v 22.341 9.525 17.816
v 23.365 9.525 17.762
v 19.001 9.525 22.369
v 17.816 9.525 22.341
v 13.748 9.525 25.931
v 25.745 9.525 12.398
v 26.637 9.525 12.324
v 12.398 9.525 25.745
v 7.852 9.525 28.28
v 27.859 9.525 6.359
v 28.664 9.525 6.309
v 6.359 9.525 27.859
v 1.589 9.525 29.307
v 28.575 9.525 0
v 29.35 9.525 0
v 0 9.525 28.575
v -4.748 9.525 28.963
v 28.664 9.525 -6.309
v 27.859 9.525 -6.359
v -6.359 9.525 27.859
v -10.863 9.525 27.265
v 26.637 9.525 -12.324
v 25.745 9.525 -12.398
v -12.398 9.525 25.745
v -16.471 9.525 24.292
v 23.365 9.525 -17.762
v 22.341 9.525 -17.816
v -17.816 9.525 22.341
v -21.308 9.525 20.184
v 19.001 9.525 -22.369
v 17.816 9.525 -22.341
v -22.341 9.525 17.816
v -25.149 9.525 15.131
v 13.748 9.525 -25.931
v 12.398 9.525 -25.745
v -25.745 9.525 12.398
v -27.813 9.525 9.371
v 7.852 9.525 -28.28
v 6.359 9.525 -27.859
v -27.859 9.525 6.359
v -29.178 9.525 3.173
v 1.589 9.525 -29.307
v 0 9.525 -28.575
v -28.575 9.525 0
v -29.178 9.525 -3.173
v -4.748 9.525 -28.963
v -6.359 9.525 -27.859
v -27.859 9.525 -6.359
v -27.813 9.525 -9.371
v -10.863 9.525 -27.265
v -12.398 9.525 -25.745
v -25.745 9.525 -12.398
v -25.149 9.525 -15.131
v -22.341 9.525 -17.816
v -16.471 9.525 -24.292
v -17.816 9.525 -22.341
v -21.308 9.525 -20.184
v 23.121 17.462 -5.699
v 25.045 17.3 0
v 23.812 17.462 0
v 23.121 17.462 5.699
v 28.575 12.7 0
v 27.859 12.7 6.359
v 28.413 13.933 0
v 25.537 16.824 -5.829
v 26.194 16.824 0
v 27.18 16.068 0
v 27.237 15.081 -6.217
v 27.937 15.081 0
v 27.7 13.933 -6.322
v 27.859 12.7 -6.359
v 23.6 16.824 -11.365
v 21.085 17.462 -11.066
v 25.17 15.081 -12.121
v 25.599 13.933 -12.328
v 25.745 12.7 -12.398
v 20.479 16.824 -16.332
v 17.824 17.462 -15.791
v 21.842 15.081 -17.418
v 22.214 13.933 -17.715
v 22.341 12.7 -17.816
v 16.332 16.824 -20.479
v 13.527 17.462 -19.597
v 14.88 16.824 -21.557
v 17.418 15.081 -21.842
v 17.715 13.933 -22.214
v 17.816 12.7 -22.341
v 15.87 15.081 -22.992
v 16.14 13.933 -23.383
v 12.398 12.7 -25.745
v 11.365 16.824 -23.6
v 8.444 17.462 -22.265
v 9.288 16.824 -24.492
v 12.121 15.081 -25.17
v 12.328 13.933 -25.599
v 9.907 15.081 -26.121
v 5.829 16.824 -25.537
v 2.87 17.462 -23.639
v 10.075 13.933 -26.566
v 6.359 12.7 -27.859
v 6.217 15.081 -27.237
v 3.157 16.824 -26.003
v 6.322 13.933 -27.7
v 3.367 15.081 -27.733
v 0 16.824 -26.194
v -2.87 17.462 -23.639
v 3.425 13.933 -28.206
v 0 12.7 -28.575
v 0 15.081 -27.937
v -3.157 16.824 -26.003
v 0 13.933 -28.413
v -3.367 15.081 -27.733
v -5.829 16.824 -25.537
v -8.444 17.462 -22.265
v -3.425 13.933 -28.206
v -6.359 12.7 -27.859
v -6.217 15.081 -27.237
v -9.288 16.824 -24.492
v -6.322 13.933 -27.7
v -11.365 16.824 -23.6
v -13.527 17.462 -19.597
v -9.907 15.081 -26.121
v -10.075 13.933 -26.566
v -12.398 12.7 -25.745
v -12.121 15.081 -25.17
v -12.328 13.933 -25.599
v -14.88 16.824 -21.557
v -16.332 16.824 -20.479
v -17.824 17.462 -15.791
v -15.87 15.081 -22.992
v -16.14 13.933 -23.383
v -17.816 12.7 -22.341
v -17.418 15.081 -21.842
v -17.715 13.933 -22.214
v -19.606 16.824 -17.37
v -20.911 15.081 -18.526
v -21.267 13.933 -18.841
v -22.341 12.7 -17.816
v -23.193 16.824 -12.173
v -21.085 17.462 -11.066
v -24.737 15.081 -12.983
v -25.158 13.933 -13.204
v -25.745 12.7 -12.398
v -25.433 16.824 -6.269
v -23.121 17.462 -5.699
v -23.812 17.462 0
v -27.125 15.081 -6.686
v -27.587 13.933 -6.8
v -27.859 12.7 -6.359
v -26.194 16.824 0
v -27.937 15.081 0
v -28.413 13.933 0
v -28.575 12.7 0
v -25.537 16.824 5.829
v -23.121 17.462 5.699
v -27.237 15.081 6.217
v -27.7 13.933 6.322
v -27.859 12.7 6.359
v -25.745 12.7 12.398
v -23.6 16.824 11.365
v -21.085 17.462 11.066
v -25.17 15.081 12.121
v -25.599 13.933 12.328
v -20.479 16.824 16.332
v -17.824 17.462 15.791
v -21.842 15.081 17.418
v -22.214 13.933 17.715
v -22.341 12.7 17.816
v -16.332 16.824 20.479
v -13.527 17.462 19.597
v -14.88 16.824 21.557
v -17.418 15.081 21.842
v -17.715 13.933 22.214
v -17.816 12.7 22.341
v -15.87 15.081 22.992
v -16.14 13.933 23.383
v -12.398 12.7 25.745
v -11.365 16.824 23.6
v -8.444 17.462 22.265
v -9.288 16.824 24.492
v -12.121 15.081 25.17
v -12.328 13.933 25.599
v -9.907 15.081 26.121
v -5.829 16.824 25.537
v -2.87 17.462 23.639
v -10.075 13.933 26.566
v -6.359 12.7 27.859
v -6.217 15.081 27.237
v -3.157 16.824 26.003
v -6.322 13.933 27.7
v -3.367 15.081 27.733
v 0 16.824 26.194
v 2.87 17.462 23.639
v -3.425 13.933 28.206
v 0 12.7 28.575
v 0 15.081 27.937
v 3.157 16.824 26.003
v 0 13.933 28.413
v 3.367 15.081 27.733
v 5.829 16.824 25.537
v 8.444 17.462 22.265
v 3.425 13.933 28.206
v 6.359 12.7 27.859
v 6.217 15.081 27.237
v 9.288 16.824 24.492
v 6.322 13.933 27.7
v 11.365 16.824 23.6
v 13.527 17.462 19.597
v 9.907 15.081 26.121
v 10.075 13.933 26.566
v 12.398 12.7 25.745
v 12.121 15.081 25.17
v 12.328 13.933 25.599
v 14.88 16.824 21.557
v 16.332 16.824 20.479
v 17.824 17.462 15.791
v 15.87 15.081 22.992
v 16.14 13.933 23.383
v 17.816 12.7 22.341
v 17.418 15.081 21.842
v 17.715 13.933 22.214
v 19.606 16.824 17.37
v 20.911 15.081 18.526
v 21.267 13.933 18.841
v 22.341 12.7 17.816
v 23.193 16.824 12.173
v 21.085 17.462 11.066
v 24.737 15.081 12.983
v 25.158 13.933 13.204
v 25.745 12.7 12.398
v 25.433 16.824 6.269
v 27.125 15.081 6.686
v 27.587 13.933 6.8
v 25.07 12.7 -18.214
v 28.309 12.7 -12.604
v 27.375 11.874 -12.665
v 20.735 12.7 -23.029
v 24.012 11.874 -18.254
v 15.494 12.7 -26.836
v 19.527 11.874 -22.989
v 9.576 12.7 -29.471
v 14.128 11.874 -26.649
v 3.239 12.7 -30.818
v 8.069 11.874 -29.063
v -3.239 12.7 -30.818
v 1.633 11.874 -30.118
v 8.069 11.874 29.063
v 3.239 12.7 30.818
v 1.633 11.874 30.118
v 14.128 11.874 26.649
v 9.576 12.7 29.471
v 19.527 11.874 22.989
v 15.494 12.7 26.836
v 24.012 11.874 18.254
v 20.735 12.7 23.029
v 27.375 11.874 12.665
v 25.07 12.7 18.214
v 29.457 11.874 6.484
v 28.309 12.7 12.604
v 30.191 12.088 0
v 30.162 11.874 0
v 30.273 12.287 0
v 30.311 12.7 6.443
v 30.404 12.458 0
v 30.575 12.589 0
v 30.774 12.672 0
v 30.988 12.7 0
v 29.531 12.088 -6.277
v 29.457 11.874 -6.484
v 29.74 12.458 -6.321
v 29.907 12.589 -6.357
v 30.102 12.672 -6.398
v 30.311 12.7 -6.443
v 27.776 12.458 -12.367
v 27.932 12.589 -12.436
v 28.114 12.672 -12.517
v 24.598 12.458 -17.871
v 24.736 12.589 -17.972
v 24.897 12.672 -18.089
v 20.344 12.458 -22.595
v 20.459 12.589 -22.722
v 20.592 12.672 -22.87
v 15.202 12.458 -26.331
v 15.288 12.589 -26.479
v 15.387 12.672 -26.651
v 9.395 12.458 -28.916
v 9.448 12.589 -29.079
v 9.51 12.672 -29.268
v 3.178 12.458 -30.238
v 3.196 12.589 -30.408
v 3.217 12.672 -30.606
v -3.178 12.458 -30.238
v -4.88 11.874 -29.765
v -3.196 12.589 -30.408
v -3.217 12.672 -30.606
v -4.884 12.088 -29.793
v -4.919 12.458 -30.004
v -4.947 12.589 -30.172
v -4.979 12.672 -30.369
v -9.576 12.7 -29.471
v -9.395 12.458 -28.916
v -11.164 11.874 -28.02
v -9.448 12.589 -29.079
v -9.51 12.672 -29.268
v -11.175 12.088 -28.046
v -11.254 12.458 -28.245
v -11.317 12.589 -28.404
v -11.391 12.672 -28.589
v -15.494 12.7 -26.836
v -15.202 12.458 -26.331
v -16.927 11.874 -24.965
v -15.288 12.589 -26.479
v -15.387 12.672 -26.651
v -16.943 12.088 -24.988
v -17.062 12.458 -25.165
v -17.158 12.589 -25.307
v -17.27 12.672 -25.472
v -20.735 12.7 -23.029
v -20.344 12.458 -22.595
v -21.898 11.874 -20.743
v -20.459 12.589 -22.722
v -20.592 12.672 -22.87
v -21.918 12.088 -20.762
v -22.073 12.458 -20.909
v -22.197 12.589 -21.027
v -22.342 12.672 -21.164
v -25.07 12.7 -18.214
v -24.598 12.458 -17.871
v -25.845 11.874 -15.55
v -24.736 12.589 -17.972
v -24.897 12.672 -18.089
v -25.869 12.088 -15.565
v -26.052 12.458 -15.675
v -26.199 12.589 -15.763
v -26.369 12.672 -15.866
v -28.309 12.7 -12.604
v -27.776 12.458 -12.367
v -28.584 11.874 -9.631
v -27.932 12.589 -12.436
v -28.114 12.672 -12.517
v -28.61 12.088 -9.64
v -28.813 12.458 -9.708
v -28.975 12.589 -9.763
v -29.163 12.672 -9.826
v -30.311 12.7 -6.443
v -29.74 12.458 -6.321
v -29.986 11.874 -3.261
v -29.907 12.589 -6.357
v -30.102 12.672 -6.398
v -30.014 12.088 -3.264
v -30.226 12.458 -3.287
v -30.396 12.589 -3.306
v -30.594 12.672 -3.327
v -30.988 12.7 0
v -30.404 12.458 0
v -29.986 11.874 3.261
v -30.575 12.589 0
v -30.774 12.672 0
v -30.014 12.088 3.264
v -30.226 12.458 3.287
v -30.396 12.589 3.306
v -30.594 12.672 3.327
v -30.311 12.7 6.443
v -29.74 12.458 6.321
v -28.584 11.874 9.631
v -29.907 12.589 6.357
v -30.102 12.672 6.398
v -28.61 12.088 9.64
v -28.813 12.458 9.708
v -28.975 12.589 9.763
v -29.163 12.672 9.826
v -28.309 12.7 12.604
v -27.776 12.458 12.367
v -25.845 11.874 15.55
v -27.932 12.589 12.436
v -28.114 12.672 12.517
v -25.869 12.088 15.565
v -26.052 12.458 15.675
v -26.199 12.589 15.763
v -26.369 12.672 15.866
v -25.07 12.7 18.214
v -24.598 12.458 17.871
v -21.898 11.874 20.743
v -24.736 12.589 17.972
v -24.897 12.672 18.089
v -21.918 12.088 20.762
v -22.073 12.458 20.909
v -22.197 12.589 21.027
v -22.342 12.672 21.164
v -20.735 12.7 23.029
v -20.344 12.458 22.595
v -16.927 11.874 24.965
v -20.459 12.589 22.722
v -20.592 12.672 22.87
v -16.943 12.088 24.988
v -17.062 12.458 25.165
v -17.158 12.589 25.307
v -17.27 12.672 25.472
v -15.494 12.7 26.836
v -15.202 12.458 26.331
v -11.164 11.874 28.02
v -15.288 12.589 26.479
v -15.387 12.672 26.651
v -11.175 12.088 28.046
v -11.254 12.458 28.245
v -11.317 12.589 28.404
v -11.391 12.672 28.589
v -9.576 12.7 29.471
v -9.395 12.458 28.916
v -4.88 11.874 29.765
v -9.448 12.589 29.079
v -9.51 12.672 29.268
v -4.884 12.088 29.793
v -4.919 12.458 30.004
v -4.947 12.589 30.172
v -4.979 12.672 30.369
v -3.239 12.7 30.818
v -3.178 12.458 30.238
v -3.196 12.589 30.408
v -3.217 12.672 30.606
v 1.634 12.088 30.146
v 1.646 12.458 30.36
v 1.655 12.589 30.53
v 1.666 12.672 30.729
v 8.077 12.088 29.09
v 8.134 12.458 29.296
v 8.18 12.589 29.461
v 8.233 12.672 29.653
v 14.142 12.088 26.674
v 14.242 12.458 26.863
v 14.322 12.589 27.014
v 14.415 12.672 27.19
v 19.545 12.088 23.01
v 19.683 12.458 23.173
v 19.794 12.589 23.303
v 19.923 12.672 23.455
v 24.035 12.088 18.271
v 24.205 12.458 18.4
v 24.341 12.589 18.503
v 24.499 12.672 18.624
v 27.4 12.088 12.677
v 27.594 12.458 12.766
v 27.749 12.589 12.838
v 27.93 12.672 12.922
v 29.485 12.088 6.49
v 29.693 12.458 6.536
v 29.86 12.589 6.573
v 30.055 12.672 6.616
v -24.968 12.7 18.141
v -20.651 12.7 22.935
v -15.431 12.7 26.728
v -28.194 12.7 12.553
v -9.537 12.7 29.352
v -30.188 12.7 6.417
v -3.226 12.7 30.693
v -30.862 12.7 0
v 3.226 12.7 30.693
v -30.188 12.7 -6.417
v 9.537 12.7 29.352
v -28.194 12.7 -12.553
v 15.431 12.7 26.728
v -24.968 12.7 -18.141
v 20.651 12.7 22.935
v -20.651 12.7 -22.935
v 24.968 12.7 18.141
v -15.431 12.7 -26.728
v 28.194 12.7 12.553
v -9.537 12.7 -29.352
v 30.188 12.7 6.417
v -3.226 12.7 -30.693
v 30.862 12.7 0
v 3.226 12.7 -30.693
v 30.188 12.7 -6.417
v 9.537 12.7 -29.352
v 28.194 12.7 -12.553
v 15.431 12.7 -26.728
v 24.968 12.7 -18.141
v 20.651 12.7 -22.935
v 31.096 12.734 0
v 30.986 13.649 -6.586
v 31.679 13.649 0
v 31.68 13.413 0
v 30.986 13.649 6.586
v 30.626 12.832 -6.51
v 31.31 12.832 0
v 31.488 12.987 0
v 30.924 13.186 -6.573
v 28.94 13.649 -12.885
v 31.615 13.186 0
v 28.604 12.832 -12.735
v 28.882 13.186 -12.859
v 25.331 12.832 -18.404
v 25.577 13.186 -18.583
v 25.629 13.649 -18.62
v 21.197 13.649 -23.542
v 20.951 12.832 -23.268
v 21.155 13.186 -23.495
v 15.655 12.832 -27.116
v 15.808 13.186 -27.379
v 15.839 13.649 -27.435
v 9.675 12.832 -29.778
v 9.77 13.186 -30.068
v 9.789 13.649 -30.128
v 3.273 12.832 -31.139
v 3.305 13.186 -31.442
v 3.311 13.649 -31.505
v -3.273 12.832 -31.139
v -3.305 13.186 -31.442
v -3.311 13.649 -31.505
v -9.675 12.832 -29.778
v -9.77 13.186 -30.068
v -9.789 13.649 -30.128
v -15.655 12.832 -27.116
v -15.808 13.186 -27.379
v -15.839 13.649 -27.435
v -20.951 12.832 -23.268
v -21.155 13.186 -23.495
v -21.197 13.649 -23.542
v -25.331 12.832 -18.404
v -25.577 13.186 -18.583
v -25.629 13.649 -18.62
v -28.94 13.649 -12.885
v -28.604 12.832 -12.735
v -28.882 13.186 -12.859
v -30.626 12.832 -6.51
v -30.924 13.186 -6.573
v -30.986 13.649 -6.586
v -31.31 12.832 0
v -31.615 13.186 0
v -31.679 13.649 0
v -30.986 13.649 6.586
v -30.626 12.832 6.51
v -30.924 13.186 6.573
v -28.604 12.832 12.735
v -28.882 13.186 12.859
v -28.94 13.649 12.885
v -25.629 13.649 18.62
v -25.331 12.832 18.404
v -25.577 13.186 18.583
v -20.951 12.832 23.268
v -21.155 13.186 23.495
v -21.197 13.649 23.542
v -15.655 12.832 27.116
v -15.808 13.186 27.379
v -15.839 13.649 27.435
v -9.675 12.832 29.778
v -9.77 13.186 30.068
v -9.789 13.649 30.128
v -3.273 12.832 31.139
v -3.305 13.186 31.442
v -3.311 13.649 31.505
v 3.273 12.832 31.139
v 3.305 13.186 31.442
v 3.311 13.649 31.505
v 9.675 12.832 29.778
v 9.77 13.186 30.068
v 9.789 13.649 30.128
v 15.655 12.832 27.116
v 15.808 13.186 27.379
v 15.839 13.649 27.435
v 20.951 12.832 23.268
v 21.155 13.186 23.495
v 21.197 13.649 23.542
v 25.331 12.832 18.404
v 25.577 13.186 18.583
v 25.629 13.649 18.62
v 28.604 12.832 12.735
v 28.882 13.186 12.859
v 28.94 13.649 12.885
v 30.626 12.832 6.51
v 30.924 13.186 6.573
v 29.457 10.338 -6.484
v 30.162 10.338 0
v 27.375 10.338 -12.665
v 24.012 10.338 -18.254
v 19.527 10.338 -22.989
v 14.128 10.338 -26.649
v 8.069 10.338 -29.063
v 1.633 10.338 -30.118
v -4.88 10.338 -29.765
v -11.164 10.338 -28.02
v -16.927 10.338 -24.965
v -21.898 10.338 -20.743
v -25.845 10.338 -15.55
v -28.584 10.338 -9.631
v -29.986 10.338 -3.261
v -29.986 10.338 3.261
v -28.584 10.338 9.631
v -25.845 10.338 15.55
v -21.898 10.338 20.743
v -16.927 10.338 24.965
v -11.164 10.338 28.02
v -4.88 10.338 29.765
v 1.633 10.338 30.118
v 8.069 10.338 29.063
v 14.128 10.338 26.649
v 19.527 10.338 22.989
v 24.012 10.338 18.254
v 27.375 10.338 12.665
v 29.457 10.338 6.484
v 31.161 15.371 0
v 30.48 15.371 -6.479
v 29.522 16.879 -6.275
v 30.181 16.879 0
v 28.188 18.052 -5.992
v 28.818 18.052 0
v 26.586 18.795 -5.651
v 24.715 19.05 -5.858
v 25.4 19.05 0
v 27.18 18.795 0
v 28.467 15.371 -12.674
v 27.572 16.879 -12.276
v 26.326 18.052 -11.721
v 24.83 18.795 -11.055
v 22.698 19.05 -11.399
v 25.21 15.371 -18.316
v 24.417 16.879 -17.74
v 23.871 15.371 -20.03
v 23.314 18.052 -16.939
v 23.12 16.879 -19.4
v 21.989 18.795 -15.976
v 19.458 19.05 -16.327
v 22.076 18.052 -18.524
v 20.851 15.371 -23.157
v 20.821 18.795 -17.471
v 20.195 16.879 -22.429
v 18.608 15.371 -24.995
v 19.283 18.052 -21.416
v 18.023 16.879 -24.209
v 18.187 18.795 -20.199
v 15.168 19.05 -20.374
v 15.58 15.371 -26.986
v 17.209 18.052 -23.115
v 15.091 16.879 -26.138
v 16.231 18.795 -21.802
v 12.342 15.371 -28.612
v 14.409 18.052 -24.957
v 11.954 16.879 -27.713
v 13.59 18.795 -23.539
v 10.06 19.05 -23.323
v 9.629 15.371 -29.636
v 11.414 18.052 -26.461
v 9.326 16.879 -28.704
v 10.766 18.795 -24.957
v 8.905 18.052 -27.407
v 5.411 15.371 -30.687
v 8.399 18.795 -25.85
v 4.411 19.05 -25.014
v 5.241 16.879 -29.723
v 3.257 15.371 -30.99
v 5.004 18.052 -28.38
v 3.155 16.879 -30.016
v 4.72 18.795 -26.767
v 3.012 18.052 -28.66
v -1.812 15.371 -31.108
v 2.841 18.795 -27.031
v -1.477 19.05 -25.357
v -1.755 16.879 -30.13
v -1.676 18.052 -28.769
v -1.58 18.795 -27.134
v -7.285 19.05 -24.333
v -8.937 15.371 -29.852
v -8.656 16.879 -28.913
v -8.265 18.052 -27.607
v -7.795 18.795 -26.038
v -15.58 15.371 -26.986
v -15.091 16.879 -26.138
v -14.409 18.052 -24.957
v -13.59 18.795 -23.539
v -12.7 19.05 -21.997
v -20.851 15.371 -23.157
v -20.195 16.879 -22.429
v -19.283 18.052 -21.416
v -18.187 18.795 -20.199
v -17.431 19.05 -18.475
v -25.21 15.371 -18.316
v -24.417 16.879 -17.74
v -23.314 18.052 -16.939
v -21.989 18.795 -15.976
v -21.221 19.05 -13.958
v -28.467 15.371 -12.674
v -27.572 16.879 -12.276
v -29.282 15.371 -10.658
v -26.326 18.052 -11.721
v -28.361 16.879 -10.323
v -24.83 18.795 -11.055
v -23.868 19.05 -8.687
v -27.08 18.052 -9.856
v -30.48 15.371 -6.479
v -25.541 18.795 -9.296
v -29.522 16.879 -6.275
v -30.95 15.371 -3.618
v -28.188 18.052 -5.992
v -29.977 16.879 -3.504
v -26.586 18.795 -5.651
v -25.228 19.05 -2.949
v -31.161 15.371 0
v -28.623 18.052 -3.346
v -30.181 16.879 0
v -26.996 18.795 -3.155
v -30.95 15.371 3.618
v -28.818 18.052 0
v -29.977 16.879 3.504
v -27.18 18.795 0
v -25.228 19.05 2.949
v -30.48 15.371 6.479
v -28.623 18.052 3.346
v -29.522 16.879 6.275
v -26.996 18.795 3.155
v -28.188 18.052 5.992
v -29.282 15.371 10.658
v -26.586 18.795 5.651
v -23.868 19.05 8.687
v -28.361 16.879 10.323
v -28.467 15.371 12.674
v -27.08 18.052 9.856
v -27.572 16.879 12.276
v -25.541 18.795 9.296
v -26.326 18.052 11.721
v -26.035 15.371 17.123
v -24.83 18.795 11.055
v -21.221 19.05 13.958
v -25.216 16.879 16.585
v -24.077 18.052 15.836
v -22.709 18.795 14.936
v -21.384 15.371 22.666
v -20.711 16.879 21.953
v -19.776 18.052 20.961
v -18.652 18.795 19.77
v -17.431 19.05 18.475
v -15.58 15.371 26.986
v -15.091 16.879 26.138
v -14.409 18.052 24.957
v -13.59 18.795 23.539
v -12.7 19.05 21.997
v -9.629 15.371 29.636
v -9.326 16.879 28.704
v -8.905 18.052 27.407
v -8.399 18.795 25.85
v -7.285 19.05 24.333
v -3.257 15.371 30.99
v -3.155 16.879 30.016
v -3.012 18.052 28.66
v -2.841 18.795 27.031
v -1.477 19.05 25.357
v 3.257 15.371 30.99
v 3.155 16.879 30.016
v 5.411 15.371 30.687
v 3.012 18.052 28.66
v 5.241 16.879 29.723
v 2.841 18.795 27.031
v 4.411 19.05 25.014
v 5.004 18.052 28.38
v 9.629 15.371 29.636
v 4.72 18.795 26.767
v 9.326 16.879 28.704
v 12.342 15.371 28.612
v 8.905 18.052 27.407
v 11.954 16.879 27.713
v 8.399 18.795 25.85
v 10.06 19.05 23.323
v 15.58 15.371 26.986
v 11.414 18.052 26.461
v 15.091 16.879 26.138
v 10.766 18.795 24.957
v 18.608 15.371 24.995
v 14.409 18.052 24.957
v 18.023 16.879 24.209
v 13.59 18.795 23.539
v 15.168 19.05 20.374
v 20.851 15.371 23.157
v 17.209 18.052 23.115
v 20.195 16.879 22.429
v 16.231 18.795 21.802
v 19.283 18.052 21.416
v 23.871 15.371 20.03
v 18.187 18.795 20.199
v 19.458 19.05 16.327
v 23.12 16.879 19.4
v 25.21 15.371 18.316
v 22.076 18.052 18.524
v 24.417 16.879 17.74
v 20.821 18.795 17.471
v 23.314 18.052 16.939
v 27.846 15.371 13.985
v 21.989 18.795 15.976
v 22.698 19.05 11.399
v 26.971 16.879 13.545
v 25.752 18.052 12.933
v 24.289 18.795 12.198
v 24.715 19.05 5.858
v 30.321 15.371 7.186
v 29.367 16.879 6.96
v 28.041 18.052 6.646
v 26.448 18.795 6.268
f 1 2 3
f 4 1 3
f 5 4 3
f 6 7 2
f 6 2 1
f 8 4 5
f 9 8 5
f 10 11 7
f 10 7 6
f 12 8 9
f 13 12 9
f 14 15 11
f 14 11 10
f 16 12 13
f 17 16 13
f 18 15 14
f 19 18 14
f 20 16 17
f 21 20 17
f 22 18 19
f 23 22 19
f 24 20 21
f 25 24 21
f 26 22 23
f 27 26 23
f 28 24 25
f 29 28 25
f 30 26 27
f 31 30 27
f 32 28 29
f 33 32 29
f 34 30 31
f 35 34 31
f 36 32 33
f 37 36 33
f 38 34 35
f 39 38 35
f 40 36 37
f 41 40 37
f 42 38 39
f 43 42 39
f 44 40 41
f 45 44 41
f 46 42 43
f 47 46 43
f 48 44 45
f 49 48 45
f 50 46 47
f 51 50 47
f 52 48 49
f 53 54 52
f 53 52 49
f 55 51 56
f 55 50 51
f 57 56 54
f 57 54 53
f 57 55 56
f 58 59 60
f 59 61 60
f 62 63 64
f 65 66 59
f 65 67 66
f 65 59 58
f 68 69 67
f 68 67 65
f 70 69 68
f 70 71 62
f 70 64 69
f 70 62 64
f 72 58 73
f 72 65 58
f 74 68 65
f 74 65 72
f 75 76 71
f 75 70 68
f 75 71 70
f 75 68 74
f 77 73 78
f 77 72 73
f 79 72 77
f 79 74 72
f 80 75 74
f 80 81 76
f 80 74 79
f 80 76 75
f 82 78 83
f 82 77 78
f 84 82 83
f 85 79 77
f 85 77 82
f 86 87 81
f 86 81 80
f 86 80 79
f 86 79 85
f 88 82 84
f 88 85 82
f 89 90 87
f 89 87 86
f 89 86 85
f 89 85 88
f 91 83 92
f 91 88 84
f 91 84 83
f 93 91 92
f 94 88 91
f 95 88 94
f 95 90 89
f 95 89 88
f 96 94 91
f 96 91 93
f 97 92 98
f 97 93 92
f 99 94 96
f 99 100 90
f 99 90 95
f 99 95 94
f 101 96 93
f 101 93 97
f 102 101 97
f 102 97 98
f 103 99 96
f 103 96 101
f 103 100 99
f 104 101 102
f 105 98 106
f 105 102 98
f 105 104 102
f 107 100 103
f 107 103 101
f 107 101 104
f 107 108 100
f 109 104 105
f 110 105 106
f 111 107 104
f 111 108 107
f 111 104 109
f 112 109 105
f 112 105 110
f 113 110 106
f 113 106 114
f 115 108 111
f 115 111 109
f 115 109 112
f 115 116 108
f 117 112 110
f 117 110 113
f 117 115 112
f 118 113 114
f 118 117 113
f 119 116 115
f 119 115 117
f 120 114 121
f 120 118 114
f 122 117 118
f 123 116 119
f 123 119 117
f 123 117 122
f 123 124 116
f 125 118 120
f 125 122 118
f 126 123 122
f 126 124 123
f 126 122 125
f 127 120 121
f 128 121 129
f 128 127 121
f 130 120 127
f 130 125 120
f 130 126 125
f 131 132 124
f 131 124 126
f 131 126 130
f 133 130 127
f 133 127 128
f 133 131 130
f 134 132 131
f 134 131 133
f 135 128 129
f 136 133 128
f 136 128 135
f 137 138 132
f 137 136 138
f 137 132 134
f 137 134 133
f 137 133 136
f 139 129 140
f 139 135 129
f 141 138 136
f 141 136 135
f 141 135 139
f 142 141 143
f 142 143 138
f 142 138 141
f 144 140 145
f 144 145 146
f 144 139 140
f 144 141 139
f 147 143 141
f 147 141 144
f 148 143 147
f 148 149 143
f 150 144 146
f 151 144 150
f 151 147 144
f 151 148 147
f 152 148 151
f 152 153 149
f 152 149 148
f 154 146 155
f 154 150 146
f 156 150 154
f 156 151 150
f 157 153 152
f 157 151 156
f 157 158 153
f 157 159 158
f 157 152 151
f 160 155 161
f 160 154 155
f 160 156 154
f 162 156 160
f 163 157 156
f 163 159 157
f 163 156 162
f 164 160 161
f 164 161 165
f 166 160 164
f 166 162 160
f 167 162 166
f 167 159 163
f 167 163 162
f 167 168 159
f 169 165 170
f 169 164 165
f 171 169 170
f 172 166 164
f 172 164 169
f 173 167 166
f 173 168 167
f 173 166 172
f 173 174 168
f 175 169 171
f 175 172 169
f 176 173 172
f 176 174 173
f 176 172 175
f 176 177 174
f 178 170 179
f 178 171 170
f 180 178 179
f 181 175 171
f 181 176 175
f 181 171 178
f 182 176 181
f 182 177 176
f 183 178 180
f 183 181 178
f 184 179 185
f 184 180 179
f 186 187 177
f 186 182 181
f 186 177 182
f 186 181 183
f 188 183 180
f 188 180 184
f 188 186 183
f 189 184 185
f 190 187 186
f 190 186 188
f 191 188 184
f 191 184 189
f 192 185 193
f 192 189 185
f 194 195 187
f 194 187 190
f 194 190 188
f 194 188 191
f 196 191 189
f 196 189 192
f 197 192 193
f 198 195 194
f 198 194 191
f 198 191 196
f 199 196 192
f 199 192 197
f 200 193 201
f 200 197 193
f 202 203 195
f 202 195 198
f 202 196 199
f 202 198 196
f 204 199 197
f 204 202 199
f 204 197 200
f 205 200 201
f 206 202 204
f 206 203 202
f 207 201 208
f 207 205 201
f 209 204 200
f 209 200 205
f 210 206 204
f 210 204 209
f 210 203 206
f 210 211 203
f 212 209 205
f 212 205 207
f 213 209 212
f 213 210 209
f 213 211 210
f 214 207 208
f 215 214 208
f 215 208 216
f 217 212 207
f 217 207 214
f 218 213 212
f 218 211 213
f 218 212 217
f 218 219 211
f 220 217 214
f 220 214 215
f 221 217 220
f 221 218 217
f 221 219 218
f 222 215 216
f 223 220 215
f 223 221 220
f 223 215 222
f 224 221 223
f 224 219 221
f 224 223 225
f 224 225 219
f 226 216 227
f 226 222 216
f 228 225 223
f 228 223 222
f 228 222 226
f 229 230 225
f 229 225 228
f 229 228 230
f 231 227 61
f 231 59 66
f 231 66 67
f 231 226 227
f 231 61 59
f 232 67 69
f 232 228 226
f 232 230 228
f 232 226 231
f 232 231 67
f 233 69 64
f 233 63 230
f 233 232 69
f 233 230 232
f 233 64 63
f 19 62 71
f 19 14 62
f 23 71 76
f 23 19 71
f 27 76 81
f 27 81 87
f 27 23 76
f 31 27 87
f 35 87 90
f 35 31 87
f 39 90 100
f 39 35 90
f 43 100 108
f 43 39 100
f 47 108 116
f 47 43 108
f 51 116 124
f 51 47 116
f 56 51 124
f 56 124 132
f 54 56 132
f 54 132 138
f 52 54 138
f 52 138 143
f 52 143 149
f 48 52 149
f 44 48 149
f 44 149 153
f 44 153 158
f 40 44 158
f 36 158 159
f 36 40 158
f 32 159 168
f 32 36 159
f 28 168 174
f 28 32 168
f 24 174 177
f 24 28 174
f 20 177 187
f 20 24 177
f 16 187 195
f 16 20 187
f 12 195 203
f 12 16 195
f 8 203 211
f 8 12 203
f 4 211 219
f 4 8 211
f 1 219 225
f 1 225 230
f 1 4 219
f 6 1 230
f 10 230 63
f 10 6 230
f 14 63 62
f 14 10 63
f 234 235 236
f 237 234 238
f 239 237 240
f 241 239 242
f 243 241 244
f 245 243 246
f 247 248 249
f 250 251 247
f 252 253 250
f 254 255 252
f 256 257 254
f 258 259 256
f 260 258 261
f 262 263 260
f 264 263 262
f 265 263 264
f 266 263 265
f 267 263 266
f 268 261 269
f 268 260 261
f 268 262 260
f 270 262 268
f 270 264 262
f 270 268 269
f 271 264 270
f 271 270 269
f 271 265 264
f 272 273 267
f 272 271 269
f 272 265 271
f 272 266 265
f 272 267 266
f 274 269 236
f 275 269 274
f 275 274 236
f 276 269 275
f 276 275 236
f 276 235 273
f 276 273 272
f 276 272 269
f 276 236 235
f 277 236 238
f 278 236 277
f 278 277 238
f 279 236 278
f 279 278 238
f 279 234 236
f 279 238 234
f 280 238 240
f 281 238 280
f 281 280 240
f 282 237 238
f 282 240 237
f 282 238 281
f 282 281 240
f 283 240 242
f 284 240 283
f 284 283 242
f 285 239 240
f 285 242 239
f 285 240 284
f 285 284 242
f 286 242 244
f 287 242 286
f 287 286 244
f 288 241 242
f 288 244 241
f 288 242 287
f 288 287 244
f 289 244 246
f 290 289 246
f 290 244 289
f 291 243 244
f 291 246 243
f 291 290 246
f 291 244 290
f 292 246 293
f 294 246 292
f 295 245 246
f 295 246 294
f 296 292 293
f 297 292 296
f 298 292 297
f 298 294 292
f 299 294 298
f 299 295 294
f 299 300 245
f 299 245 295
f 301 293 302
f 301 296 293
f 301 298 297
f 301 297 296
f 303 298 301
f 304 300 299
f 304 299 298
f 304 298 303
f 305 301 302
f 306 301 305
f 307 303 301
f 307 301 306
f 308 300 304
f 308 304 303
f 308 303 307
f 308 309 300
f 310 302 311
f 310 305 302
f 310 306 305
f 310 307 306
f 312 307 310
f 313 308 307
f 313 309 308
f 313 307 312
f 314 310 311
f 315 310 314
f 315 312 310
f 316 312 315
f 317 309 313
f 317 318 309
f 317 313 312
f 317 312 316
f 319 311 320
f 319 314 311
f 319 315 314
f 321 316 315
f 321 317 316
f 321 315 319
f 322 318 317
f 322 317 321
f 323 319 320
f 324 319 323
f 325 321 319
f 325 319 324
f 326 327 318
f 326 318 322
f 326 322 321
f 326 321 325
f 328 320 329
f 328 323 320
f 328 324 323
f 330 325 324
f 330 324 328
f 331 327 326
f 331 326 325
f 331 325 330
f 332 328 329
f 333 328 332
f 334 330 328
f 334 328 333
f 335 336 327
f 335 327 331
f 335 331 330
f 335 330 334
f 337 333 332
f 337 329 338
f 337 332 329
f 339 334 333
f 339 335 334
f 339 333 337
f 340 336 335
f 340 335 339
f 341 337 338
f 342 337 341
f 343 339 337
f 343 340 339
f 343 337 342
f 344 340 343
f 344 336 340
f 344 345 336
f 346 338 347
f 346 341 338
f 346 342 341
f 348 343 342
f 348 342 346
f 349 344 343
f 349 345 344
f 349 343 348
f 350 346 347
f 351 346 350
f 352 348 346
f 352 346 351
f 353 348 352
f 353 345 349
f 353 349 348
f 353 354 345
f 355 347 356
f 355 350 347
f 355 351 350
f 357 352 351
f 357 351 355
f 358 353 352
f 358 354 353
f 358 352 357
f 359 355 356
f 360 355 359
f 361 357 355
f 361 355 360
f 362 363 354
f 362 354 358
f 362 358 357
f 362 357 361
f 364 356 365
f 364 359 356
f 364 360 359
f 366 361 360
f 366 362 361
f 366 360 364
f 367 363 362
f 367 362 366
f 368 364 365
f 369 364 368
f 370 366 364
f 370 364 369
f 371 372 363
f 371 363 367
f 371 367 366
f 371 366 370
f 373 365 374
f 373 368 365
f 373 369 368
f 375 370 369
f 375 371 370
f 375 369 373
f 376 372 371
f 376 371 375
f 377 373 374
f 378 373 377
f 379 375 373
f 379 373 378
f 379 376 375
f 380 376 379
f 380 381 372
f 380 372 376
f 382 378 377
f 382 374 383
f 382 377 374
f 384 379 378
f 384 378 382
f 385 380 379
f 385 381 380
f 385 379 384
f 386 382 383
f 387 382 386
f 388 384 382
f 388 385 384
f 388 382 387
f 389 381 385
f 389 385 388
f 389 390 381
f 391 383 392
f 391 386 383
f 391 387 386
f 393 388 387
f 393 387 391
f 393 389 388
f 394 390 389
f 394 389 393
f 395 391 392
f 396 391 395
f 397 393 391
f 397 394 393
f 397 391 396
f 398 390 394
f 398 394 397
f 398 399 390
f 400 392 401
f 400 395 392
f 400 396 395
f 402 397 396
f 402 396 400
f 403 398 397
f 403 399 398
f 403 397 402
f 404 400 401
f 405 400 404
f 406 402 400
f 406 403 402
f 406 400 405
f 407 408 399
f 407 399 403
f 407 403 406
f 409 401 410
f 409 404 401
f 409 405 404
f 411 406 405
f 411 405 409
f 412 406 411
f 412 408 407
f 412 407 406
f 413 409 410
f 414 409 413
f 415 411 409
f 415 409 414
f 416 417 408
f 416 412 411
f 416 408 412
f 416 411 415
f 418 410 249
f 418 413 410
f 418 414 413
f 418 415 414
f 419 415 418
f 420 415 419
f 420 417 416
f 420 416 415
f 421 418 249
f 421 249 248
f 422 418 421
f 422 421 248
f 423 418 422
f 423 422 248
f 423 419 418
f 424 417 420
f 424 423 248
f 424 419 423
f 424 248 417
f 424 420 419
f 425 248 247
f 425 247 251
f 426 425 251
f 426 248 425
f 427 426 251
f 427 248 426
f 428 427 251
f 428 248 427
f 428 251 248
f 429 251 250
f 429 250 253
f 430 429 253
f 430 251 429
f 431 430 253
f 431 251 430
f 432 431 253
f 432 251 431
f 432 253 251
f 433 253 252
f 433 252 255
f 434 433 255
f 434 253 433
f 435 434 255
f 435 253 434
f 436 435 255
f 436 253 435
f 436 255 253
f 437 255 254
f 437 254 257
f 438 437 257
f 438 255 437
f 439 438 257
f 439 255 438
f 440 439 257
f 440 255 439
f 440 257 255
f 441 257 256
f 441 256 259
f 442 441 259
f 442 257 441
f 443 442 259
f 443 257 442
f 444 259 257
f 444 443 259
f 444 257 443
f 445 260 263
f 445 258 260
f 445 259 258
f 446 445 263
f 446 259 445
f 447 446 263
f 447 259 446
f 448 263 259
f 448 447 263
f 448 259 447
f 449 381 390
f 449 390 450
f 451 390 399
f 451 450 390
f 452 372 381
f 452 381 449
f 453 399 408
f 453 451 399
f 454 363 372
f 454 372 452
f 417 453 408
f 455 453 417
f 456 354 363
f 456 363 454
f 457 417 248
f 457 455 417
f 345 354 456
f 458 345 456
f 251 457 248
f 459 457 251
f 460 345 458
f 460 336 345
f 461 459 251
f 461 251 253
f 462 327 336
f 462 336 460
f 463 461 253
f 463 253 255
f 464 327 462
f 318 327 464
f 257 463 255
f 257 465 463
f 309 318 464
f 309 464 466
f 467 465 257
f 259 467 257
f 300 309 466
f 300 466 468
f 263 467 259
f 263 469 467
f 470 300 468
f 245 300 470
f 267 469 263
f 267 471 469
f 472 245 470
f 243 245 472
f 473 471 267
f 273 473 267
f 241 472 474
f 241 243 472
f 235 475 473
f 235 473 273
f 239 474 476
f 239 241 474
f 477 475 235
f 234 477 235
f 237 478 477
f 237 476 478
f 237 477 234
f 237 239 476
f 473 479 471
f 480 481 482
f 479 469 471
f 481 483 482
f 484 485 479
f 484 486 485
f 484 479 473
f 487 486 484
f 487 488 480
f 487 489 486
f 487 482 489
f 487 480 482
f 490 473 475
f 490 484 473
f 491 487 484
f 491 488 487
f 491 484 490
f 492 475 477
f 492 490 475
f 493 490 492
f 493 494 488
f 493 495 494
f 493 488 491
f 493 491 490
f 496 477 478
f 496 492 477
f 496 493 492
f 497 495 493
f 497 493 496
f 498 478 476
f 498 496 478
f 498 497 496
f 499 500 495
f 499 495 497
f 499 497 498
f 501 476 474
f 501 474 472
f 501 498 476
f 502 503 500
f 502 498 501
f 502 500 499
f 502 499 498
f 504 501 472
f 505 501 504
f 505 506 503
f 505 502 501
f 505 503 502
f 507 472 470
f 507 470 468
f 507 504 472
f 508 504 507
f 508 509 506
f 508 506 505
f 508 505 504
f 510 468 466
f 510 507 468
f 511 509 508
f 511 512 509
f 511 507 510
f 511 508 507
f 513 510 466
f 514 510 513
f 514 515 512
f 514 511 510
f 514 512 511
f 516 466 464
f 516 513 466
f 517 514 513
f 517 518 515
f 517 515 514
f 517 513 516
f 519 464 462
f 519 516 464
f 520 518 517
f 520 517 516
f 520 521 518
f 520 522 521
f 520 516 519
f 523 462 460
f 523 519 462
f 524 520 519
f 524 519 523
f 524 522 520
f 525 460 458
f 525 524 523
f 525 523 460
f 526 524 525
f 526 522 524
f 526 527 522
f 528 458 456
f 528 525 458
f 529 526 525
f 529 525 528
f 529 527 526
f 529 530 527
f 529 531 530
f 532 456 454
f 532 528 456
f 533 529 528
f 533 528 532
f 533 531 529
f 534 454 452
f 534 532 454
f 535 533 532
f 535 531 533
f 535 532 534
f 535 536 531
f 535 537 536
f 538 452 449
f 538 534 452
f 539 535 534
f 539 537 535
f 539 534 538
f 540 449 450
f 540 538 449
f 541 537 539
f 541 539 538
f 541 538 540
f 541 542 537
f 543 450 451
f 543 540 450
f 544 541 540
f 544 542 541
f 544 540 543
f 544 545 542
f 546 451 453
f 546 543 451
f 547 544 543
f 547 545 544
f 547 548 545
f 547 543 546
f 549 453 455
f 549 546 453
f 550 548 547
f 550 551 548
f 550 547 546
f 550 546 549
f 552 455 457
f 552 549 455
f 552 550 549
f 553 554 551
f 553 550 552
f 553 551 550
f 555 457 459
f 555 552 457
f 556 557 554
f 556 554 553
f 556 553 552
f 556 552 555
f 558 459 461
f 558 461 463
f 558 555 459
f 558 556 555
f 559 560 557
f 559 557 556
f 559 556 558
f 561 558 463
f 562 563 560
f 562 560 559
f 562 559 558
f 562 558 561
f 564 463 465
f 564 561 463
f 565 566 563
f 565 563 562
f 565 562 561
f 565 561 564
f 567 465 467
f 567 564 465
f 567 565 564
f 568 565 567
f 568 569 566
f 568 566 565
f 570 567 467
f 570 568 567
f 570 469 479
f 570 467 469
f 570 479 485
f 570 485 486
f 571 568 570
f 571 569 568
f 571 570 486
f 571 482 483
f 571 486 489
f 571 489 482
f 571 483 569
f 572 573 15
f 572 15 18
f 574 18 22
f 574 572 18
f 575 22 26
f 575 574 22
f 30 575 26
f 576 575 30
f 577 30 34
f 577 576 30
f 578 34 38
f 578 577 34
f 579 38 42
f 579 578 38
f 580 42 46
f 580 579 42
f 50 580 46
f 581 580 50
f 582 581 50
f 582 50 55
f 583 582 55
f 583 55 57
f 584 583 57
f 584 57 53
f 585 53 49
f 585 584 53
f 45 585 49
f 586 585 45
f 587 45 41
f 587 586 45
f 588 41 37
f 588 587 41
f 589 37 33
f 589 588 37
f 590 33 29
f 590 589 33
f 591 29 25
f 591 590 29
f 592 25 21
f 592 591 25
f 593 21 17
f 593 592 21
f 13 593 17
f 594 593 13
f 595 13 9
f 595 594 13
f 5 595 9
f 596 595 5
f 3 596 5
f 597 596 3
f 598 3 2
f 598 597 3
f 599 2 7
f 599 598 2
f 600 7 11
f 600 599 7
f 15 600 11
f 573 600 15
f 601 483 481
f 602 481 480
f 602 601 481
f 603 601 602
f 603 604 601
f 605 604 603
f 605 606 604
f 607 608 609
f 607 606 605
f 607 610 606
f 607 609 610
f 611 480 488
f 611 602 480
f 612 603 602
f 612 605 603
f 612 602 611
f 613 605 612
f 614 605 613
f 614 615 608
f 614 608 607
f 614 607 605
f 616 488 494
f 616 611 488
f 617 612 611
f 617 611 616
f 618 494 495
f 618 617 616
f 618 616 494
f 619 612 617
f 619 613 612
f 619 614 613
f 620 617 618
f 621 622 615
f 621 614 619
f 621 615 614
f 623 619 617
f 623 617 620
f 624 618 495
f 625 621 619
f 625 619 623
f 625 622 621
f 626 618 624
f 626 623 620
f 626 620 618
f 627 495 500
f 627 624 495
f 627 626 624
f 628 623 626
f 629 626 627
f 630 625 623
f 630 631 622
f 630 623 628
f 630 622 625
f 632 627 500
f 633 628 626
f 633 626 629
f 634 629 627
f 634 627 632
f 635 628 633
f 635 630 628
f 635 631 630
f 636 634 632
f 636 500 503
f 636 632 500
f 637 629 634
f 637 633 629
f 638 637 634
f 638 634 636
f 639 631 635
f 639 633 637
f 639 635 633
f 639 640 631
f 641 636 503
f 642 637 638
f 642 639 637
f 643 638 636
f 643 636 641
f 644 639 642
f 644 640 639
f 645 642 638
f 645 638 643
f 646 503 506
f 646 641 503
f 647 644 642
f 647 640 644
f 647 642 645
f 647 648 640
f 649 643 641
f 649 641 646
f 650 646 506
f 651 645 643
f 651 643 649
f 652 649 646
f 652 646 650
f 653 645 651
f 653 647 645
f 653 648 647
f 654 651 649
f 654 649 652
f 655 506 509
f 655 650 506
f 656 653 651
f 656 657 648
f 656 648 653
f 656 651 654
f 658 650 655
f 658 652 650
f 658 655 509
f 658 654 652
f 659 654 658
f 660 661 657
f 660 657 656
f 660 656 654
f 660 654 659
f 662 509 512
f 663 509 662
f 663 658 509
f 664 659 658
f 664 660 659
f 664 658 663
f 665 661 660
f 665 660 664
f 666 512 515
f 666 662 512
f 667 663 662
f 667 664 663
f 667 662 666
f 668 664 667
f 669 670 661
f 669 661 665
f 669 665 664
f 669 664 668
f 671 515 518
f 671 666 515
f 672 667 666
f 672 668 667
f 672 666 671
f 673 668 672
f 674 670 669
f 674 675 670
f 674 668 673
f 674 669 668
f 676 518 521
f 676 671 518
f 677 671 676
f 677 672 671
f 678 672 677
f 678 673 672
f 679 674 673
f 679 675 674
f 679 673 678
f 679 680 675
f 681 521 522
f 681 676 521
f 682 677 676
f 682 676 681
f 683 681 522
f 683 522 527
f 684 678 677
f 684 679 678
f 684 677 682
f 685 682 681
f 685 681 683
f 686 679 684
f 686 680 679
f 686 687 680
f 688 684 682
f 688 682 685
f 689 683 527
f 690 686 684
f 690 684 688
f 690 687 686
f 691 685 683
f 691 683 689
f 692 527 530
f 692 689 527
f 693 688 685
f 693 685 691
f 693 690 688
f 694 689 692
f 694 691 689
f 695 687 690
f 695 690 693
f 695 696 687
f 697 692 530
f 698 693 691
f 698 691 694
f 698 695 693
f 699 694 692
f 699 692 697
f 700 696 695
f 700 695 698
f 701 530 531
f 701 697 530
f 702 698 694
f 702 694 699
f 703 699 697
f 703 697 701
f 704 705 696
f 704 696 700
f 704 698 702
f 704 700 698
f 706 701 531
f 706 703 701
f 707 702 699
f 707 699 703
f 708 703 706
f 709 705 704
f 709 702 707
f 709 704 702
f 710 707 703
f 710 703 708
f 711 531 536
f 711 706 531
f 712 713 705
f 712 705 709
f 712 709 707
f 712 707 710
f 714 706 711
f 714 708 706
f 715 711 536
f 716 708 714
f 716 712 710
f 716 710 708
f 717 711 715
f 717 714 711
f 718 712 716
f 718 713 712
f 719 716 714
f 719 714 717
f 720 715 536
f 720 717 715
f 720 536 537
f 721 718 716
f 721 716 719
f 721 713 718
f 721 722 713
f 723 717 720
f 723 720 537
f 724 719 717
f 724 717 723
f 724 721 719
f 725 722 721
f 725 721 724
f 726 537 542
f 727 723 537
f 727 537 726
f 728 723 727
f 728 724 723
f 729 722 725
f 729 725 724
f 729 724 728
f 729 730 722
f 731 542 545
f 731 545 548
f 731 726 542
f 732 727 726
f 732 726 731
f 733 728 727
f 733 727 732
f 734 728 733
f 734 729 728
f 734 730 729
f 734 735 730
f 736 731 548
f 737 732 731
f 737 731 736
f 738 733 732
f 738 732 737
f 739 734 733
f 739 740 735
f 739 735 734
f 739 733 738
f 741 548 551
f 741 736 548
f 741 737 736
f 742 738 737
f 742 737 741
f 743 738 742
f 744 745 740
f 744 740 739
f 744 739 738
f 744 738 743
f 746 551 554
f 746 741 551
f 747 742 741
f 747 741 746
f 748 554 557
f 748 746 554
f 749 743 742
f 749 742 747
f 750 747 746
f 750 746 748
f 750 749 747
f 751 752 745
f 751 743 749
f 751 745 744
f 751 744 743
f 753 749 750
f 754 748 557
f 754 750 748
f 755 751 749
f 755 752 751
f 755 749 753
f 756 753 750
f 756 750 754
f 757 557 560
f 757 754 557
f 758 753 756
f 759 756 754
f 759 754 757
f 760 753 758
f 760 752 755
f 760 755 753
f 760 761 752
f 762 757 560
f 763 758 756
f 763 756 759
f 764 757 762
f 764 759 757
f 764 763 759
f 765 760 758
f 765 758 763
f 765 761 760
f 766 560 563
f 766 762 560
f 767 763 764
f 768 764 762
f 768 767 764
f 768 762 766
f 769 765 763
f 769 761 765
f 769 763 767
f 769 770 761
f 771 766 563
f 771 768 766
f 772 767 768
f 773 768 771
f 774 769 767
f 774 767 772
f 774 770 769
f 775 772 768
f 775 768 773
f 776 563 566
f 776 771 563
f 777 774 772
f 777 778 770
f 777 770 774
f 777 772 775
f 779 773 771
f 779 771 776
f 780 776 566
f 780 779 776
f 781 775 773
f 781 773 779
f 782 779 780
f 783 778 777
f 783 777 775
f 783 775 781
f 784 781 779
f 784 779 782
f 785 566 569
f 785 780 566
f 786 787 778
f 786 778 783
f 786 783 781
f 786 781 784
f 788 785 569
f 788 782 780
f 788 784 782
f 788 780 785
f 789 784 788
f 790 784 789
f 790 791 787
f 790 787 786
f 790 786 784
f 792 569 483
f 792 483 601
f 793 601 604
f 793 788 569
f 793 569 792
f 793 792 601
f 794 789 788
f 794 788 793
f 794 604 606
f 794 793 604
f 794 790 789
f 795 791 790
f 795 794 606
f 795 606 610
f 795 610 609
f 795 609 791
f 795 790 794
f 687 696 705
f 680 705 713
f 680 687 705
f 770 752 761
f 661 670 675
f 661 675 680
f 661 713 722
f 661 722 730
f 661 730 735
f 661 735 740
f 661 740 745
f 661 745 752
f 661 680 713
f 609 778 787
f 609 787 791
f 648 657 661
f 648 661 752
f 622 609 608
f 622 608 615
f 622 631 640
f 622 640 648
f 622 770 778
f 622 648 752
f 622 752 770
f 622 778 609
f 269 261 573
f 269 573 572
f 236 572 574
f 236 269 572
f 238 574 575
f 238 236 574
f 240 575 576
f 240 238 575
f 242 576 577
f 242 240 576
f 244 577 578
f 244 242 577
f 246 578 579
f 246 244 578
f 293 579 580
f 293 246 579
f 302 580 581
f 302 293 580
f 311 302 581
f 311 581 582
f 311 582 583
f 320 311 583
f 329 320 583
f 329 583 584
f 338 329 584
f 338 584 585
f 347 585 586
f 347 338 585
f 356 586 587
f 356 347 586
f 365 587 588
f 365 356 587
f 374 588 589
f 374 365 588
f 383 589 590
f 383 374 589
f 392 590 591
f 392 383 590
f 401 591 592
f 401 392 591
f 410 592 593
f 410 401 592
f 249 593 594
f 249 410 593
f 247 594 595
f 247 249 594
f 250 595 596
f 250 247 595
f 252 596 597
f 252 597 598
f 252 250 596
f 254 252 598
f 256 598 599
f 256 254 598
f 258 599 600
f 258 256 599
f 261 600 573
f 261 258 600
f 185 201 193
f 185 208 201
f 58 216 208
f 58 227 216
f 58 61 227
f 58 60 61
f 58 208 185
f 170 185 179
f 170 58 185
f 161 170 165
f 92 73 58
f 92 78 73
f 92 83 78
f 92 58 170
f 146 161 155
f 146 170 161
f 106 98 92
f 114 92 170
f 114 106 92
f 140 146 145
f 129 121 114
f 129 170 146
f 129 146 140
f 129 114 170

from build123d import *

# Parameters (mm, degrees)
F2_SIZE = 0.8128


with BuildPart() as f1:
    # F0 (on Top) → F1 (revolve)
    with BuildSketch(Plane.XY):
        with BuildLine():
            Line((25.4, 19.05), (0, 19.05))
            Line((0, 19.05), (0, 17.4625))
            Line((0, 17.4625), (23.8125, 17.4625))
            ThreePointArc((23.8125, 17.4625), (27.180096, 16.067596), (28.575, 12.7))
            Line((28.575, 12.7), (28.575, 9.525))
            Line((28.575, 9.525), (30.1625, 9.525))
            Line((30.1625, 9.525), (30.1625, 11.8745))
            ThreePointArc((30.1625, 11.8745), (30.404283, 12.458217), (30.988, 12.7))
            Line((30.988, 12.7), (30.862477, 12.7))
            ThreePointArc((30.862477, 12.7), (31.488286, 12.987158), (31.678709, 13.648851))
            ThreePointArc((31.678709, 13.648851), (29.541093, 17.513923), (25.4, 19.05))
        make_face()
    revolve(axis=Axis((0, 18.25625, 0), (0, 1, 0)))

    # F2
    f2_edges = [f1.edges().sort_by_distance(p)[0] for p in [
        (-30.1625, 9.525, 0),
    ]]
    chamfer(f2_edges, length=F2_SIZE)


solid = f1.part
